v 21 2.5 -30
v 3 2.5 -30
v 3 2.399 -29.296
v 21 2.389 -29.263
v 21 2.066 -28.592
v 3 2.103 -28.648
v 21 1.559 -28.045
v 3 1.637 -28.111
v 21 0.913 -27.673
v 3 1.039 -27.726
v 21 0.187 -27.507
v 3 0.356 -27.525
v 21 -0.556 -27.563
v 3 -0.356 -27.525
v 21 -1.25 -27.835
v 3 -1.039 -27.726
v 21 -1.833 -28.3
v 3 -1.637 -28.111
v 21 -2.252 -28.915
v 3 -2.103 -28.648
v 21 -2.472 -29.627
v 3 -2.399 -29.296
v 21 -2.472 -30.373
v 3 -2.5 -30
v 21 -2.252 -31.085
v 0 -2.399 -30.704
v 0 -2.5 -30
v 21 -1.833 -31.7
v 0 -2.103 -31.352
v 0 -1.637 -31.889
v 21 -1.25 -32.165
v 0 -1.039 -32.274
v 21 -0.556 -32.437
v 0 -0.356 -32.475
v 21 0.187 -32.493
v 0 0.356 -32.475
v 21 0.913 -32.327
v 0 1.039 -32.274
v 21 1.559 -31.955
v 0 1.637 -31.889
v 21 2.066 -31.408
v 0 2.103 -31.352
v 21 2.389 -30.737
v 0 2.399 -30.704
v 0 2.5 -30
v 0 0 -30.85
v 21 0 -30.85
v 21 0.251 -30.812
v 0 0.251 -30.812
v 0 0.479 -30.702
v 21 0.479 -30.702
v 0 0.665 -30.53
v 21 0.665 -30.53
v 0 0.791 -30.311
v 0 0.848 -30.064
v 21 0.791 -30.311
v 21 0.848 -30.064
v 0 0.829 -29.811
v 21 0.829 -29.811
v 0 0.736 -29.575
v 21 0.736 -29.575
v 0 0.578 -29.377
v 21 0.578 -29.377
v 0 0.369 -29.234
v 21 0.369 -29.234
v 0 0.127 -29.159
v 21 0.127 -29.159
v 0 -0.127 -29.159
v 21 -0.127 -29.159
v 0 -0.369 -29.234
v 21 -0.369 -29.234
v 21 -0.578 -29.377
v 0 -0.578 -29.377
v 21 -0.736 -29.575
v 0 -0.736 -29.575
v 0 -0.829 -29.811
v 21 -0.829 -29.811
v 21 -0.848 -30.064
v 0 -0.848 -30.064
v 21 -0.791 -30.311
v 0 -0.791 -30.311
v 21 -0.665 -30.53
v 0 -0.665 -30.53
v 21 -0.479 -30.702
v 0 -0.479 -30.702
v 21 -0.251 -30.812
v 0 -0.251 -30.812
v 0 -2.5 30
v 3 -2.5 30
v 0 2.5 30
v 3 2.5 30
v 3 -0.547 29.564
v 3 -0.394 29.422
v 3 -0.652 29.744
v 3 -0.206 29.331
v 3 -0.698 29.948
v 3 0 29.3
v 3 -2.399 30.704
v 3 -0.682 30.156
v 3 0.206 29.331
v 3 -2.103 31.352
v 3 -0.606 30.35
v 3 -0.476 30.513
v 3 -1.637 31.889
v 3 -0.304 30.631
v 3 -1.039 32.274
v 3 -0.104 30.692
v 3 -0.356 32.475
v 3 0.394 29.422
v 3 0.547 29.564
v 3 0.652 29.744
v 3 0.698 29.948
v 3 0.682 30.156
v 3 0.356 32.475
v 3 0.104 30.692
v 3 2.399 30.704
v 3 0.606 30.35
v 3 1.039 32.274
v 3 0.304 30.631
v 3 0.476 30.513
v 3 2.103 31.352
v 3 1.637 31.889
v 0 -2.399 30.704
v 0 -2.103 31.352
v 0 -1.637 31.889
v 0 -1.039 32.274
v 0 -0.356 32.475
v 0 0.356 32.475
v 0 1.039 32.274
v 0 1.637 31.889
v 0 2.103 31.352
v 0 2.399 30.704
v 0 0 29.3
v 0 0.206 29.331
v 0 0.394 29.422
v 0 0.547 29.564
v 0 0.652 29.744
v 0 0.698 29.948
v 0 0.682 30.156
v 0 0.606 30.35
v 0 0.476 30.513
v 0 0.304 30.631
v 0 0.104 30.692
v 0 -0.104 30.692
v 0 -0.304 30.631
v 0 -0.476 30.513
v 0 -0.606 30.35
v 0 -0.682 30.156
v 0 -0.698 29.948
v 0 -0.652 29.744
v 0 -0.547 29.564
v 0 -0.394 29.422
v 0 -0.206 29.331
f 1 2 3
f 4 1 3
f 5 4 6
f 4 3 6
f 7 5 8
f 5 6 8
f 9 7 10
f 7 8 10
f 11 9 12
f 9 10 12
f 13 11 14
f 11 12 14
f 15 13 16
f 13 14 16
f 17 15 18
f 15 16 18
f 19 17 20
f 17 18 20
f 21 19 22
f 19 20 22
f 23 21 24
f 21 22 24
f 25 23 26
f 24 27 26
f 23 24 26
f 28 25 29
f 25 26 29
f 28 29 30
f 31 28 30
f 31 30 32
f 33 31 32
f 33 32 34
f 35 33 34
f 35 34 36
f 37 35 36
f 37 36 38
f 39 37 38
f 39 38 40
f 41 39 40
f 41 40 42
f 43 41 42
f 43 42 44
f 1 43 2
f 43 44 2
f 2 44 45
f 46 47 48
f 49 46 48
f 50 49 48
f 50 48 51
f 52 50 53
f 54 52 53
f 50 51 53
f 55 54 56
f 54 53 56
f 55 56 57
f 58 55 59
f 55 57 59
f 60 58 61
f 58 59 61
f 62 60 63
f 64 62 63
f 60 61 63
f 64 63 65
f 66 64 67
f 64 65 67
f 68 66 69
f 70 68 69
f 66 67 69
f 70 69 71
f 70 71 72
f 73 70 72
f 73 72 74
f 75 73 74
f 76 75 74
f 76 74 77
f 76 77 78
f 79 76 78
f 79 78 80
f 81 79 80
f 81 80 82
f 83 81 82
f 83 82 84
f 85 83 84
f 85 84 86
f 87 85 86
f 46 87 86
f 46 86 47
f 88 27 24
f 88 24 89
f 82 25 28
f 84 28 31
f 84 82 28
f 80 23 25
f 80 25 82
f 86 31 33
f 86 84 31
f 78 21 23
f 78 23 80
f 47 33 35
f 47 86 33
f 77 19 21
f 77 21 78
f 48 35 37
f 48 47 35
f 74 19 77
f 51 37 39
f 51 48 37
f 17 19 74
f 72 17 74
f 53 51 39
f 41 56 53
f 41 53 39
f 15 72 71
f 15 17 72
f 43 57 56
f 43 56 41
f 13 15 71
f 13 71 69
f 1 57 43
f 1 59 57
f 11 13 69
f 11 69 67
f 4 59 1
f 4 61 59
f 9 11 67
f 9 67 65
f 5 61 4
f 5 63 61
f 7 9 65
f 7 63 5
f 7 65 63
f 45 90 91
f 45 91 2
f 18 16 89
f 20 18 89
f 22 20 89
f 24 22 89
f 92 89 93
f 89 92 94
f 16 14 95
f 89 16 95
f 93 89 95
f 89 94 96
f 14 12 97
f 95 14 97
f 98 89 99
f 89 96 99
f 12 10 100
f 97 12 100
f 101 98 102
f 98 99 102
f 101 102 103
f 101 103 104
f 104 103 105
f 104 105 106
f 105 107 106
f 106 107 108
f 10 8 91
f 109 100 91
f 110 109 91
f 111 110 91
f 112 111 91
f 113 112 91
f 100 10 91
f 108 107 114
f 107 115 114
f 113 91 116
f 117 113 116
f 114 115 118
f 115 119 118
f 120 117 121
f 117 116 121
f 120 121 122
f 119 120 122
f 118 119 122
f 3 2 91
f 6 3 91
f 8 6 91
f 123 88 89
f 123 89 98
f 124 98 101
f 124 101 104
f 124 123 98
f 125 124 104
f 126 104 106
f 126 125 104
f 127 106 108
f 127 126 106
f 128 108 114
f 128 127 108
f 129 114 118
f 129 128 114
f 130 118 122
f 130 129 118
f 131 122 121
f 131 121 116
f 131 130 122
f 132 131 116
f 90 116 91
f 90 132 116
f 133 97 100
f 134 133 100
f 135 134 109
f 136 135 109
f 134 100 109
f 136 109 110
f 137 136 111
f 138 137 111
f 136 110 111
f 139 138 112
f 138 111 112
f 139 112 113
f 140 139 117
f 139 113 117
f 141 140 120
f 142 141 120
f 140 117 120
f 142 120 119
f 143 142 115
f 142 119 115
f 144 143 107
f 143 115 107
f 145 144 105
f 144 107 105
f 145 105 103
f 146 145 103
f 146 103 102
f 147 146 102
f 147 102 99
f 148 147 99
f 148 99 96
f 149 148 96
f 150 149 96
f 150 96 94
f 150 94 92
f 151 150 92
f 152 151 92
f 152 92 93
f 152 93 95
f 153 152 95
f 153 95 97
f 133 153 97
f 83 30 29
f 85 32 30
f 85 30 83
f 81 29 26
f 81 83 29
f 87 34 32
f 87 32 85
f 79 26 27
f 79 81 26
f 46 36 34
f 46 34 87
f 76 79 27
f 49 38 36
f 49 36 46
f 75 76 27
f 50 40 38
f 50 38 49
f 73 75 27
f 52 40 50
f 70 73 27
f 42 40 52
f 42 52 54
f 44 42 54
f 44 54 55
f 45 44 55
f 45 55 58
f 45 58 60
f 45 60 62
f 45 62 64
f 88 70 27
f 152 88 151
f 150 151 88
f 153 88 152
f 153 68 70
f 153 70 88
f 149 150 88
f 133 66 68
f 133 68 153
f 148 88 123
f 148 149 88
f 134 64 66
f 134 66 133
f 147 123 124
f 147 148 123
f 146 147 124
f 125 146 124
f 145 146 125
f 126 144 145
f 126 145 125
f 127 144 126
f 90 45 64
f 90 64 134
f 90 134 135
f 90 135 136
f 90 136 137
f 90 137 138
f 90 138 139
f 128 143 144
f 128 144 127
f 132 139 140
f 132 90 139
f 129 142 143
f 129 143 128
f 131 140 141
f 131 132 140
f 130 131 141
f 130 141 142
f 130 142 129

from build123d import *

# Parameters (mm, degrees)
RESSALTO_EXTRUS_O1_DEPTH = 3
ESBO_O2_R                = 2.5
RESSALTO_EXTRUS_O2_DEPTH = 18
ESBO_O3_R                = 0.85
CORTE_EXTRUS_O1_DEPTH    = 39.774991941
ESBO_O4_R                = 0.7
CORTE_EXTRUS_O2_DEPTH    = 38.235735524


with BuildPart() as part:
    # Esboço1 → Ressalto-extrusão1 (new body)
    with BuildSketch(Plane(origin=(0, 0, 0), x_dir=(0, 0, -1), z_dir=(1, 0, 0))):
        with BuildLine():
            Line((-30, 2.5), (30, 2.5))
            ThreePointArc((30, 2.5), (32.5, 0), (30, -2.5))
            Line((30, -2.5), (-30, -2.5))
            ThreePointArc((-30, -2.5), (-32.5, 0), (-30, 2.5))
        make_face()
    extrude(amount=RESSALTO_EXTRUS_O1_DEPTH)

    # Esboço2 → Ressalto-extrusão2 (add)
    with BuildSketch(Plane(origin=(3, 0, 0), x_dir=(0, 0, -1), z_dir=(1, 0, 0))):
        with Locations(Location((30, 0, 0), (0, 0, 90))):
            Circle(ESBO_O2_R)
    extrude(amount=RESSALTO_EXTRUS_O2_DEPTH)

    # Esboço3 → Corte-extrusão1 (cut, through all)
    with BuildSketch(Plane(origin=(21, 0, 0), x_dir=(0, 0, -1), z_dir=(1, 0, 0))):
        with Locations((30, 0)):
            Circle(ESBO_O3_R)
    extrude(amount=-CORTE_EXTRUS_O1_DEPTH, mode=Mode.SUBTRACT)

    # Esboço4 → Corte-extrusão2 (cut, through all)
    with BuildSketch(Plane(origin=(3, 0, 0), x_dir=(0, 0, -1), z_dir=(1, 0, 0))):
        with Locations((-30, 0)):
            Circle(ESBO_O4_R)
    extrude(amount=-CORTE_EXTRUS_O2_DEPTH, mode=Mode.SUBTRACT)


solid = part.part
